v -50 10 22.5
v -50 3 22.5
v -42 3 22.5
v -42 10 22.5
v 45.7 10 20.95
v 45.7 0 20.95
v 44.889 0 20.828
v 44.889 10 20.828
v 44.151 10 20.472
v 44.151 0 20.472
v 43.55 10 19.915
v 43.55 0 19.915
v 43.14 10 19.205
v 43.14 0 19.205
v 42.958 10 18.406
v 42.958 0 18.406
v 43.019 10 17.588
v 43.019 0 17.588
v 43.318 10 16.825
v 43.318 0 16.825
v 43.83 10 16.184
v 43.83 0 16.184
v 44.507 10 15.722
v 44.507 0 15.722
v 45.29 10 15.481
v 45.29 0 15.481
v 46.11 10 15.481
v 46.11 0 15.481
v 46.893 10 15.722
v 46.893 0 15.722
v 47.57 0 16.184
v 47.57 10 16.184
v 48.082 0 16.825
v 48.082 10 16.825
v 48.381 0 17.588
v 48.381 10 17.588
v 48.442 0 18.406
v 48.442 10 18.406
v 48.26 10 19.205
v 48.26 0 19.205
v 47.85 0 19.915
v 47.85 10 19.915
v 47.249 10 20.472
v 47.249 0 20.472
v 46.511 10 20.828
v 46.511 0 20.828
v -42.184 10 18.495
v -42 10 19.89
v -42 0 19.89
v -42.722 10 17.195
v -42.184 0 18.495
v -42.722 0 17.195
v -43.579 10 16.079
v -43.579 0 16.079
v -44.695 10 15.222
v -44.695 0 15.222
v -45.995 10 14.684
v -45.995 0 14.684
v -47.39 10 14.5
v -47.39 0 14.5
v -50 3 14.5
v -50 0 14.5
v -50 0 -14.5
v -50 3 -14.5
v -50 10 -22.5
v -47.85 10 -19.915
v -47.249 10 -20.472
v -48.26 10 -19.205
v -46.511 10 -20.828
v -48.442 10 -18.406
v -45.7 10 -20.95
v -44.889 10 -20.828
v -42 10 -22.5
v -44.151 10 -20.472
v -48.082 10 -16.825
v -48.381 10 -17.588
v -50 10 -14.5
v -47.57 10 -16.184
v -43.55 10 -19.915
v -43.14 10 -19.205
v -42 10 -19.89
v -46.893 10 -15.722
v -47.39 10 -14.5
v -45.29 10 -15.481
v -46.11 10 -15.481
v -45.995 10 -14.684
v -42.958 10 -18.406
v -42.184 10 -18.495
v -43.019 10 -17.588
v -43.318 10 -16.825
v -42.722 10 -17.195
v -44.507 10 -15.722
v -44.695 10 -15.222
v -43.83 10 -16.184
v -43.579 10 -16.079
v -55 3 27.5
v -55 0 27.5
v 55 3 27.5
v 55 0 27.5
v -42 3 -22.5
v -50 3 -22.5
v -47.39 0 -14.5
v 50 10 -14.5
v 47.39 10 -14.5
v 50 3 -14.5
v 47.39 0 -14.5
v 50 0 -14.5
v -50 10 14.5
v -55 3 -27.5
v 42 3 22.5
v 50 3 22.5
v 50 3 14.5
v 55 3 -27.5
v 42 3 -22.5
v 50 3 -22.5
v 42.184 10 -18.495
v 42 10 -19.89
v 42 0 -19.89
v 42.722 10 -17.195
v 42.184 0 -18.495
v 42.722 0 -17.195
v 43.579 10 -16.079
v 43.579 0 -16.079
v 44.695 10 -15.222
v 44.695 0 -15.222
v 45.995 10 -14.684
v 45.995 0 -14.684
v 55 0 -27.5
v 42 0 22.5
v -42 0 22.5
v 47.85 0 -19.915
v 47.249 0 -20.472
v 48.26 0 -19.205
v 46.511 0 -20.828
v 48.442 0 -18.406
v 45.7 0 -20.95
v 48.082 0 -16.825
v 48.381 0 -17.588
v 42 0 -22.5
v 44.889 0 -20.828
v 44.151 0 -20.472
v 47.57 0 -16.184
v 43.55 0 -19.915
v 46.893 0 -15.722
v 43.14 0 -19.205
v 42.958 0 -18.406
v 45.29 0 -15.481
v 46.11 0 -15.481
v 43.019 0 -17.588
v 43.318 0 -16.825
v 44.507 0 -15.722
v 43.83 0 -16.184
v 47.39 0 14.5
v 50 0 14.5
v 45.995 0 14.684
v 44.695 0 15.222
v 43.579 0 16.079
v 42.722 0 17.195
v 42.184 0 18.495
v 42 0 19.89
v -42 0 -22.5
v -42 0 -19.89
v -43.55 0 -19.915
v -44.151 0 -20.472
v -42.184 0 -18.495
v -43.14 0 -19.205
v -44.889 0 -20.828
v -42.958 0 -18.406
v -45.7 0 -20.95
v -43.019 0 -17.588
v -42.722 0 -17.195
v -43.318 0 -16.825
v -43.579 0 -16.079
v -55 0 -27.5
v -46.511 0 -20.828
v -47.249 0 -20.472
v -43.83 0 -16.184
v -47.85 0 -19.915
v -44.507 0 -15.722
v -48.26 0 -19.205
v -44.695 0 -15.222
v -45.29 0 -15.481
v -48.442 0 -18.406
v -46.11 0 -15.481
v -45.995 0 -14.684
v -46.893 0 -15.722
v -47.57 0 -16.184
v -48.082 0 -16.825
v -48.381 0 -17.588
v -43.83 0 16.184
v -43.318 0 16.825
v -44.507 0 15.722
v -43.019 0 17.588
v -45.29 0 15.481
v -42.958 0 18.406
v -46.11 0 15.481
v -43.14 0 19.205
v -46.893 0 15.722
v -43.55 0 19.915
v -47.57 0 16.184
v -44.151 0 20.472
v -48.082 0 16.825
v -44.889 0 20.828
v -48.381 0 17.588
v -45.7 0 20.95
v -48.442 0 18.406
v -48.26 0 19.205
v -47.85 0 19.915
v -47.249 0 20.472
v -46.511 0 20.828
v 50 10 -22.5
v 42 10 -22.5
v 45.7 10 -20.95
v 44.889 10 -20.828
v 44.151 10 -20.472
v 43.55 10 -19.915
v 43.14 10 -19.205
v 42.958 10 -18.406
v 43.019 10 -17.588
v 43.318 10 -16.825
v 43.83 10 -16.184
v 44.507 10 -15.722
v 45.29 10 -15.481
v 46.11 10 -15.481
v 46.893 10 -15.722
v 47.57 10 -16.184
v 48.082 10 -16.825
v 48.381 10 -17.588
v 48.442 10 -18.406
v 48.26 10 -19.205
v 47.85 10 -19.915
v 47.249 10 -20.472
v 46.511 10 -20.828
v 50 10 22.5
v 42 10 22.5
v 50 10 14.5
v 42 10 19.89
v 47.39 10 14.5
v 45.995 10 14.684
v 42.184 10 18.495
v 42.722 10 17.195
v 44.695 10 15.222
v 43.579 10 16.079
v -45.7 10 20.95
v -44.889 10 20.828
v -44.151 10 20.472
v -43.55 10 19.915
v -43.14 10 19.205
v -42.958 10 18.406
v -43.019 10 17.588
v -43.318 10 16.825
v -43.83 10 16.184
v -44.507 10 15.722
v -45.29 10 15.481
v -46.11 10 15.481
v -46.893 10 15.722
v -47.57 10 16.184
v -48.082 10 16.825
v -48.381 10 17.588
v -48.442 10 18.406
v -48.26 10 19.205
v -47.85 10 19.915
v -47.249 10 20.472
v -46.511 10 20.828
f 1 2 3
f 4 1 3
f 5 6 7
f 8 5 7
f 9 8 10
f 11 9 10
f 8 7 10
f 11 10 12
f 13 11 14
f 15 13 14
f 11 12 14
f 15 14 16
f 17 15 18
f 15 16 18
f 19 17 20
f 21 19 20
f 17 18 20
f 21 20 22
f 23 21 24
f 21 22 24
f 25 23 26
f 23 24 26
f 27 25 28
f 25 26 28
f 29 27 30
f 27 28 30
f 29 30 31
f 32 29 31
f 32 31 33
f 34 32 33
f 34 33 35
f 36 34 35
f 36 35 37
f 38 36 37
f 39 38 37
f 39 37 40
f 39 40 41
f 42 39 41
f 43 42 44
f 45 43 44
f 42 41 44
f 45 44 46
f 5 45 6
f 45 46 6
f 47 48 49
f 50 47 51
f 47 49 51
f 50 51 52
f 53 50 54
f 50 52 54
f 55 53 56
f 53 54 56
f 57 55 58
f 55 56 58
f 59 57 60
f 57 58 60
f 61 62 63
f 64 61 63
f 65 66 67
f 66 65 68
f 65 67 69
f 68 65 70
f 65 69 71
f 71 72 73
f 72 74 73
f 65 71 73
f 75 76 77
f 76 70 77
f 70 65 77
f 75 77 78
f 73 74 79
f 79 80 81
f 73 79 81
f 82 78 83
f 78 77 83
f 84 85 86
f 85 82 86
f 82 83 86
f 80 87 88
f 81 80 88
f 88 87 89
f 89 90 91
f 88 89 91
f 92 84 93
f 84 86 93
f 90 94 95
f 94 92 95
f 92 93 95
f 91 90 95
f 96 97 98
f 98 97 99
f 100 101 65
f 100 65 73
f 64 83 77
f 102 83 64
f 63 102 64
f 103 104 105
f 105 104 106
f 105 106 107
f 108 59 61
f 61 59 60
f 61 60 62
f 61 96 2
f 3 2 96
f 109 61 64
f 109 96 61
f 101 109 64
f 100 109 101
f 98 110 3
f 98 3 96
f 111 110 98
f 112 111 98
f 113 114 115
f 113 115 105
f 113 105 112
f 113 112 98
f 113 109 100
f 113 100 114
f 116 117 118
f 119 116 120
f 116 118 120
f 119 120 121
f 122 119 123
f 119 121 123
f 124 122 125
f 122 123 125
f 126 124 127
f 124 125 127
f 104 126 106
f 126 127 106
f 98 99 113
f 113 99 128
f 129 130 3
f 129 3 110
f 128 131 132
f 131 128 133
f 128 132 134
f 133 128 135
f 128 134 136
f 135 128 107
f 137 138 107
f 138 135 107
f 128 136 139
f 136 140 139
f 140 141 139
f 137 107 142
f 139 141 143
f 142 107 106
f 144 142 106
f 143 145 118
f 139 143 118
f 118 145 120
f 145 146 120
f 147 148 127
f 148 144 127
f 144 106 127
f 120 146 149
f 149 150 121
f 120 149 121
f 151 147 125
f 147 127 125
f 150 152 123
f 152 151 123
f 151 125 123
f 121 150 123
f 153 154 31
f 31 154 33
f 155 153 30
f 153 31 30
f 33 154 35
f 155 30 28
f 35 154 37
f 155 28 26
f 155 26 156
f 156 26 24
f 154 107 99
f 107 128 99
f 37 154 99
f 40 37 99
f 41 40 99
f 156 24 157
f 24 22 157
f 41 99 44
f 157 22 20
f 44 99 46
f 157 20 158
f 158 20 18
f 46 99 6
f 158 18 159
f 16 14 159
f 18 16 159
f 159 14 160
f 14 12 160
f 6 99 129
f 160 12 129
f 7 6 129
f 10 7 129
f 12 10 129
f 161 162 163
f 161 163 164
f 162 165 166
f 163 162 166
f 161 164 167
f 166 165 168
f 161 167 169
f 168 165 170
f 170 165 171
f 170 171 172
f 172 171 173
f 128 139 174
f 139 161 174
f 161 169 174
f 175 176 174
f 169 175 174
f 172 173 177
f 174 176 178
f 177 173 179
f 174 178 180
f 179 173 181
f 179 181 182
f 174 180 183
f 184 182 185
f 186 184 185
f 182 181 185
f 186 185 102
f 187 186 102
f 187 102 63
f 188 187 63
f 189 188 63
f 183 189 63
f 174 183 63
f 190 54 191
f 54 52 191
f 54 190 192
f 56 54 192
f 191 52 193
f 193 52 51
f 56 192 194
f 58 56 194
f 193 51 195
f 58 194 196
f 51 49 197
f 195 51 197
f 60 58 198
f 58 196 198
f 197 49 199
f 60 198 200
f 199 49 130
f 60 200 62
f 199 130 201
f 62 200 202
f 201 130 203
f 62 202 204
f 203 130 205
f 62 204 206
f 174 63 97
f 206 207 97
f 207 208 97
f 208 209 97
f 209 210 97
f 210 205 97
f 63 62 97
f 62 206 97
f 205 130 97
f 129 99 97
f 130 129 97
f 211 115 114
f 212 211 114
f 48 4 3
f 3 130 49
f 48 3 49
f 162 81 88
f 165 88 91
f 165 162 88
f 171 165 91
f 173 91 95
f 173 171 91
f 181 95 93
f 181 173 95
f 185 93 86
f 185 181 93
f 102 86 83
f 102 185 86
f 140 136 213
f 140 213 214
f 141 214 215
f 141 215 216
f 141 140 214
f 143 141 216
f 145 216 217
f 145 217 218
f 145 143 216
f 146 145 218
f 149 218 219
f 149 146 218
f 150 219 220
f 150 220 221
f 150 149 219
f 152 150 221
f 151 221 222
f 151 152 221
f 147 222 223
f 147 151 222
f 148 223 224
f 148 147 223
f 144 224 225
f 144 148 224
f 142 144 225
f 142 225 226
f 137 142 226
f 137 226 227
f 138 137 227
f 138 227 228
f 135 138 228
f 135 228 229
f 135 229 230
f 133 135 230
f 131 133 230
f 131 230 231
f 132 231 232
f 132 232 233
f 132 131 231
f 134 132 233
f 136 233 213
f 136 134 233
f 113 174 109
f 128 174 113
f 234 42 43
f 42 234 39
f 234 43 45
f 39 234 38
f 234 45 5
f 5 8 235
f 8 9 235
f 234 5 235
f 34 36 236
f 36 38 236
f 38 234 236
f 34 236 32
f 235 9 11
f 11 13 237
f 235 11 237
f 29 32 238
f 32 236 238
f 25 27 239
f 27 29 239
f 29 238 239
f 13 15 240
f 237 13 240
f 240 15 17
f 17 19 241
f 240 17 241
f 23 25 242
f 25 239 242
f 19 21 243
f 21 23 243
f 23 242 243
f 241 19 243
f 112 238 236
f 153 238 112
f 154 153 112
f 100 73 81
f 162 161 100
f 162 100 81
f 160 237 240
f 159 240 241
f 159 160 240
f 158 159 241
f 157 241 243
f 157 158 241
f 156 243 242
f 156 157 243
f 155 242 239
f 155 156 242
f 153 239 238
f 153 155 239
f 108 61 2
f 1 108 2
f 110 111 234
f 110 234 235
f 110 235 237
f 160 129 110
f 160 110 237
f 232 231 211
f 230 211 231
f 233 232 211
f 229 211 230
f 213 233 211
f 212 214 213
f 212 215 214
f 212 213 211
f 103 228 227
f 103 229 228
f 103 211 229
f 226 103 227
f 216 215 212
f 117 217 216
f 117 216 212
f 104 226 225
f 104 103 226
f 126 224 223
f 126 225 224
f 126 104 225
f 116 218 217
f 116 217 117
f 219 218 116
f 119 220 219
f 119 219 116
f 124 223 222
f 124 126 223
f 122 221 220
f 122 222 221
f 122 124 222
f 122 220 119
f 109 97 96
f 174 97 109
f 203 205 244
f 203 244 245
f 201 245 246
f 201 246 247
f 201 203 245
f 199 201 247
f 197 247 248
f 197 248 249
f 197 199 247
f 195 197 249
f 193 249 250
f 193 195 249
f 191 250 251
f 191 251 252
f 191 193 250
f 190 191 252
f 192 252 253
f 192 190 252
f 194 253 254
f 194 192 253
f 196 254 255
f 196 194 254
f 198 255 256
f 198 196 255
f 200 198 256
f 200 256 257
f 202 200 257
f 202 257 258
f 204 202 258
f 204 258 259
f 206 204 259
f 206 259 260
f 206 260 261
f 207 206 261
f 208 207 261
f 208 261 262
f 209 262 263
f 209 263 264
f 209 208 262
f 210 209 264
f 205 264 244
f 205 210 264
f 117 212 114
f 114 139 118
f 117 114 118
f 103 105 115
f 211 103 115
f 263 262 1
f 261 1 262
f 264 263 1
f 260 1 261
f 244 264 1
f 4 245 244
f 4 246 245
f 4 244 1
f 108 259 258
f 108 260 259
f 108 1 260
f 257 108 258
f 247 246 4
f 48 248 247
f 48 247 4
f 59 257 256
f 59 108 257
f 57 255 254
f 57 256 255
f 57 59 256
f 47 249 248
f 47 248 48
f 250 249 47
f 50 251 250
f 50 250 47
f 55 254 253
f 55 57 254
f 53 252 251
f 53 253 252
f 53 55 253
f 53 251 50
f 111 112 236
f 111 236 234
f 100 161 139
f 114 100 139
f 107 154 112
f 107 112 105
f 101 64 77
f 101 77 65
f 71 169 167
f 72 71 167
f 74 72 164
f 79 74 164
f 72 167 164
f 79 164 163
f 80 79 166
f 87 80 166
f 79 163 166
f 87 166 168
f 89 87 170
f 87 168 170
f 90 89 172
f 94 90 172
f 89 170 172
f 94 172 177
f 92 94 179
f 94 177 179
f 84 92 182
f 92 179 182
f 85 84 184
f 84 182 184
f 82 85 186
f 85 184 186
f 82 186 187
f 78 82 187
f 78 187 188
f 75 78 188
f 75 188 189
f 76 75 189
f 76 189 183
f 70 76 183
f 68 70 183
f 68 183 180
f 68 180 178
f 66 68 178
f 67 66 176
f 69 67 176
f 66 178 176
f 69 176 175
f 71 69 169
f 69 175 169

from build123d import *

# Parameters (mm, degrees)
SKETCH1_W                                  = 110
SKETCH1_H                                  = 55
SKETCH1_W_2                                = 100
SKETCH1_H_2                                = 45
BOSS_EXTRUDE1_DEPTH                        = 3
BOSS_EXTRUDE2_START                        = -3
SKETCH2_R                                  = 2.75
BOSS_EXTRUDE2_DEPTH                        = 10
MIRROR1_START                              = -3
MIRROR1_AT_THE_SECOND_PLANE_COPY_1_SKETC_R = 2.75
MIRROR1_AT_THE_SECOND_PLANE_COPY_1_DEPTH   = 10


with BuildPart() as part:
    # Sketch1 → Boss-Extrude1 (new body)
    with BuildSketch(Plane(origin=(0, 0, 0), x_dir=(1, 0, 0), z_dir=(0, 1, 0))):
        Rectangle(SKETCH1_W, SKETCH1_H)
        Rectangle(SKETCH1_W_2, SKETCH1_H_2, mode=Mode.SUBTRACT)
    extrude(amount=BOSS_EXTRUDE1_DEPTH)

    # Sketch2 → Boss-Extrude2 (add)
    with BuildSketch(Plane(origin=(0, 3, 0), x_dir=(1, 0, 0), z_dir=(0, 1, 0)).offset(BOSS_EXTRUDE2_START)):
        with BuildLine():
            Line((-50, -22.5), (-42, -22.5))
            Line((-42, -22.5), (-42, -19.889949494))
            ThreePointArc((-42, -19.889949494), (-43.578679656, -16.078679656), (-47.389949494, -14.5))
            Line((-47.389949494, -14.5), (-50, -14.5))
            Line((-50, -14.5), (-50, -22.5))
        make_face()
        with Locations(Location((-45.7, -18.2, 0), (0, 0, 270))):
            Circle(SKETCH2_R, mode=Mode.SUBTRACT)
    boss_extrude2 = extrude(amount=BOSS_EXTRUDE2_DEPTH)

    # Mirror1: Boss-Extrude2 across plane
    add(boss_extrude2.mirror(Plane.XY))

    # Mirror1 at the second plane: Boss-Extrude2 across plane
    add(boss_extrude2.mirror(Plane(origin=(0, 0, 0), x_dir=(0, 0, 1), z_dir=(1, 0, 0))))

    # Mirror1 at the second plane copy 1 sketc → Mirror1 at the second plane copy 1 (add)
    with BuildSketch(Plane(origin=(0, 3, 0), x_dir=(-1, 0, 0), z_dir=(0, 1, 0)).offset(MIRROR1_START)):
        with BuildLine():
            Line((-50, -22.5), (-42, -22.5))
            Line((-42, -22.5), (-42, -19.889949494))
            ThreePointArc((-42, -19.889949494), (-43.578679656, -16.078679656), (-47.389949494, -14.5))
            Line((-47.389949494, -14.5), (-50, -14.5))
            Line((-50, -14.5), (-50, -22.5))
        make_face()
        with Locations(Location((-45.7, -18.2, 0), (0, 0, 270))):
            Circle(MIRROR1_AT_THE_SECOND_PLANE_COPY_1_SKETC_R, mode=Mode.SUBTRACT)
    extrude(amount=MIRROR1_AT_THE_SECOND_PLANE_COPY_1_DEPTH)


solid = part.part
